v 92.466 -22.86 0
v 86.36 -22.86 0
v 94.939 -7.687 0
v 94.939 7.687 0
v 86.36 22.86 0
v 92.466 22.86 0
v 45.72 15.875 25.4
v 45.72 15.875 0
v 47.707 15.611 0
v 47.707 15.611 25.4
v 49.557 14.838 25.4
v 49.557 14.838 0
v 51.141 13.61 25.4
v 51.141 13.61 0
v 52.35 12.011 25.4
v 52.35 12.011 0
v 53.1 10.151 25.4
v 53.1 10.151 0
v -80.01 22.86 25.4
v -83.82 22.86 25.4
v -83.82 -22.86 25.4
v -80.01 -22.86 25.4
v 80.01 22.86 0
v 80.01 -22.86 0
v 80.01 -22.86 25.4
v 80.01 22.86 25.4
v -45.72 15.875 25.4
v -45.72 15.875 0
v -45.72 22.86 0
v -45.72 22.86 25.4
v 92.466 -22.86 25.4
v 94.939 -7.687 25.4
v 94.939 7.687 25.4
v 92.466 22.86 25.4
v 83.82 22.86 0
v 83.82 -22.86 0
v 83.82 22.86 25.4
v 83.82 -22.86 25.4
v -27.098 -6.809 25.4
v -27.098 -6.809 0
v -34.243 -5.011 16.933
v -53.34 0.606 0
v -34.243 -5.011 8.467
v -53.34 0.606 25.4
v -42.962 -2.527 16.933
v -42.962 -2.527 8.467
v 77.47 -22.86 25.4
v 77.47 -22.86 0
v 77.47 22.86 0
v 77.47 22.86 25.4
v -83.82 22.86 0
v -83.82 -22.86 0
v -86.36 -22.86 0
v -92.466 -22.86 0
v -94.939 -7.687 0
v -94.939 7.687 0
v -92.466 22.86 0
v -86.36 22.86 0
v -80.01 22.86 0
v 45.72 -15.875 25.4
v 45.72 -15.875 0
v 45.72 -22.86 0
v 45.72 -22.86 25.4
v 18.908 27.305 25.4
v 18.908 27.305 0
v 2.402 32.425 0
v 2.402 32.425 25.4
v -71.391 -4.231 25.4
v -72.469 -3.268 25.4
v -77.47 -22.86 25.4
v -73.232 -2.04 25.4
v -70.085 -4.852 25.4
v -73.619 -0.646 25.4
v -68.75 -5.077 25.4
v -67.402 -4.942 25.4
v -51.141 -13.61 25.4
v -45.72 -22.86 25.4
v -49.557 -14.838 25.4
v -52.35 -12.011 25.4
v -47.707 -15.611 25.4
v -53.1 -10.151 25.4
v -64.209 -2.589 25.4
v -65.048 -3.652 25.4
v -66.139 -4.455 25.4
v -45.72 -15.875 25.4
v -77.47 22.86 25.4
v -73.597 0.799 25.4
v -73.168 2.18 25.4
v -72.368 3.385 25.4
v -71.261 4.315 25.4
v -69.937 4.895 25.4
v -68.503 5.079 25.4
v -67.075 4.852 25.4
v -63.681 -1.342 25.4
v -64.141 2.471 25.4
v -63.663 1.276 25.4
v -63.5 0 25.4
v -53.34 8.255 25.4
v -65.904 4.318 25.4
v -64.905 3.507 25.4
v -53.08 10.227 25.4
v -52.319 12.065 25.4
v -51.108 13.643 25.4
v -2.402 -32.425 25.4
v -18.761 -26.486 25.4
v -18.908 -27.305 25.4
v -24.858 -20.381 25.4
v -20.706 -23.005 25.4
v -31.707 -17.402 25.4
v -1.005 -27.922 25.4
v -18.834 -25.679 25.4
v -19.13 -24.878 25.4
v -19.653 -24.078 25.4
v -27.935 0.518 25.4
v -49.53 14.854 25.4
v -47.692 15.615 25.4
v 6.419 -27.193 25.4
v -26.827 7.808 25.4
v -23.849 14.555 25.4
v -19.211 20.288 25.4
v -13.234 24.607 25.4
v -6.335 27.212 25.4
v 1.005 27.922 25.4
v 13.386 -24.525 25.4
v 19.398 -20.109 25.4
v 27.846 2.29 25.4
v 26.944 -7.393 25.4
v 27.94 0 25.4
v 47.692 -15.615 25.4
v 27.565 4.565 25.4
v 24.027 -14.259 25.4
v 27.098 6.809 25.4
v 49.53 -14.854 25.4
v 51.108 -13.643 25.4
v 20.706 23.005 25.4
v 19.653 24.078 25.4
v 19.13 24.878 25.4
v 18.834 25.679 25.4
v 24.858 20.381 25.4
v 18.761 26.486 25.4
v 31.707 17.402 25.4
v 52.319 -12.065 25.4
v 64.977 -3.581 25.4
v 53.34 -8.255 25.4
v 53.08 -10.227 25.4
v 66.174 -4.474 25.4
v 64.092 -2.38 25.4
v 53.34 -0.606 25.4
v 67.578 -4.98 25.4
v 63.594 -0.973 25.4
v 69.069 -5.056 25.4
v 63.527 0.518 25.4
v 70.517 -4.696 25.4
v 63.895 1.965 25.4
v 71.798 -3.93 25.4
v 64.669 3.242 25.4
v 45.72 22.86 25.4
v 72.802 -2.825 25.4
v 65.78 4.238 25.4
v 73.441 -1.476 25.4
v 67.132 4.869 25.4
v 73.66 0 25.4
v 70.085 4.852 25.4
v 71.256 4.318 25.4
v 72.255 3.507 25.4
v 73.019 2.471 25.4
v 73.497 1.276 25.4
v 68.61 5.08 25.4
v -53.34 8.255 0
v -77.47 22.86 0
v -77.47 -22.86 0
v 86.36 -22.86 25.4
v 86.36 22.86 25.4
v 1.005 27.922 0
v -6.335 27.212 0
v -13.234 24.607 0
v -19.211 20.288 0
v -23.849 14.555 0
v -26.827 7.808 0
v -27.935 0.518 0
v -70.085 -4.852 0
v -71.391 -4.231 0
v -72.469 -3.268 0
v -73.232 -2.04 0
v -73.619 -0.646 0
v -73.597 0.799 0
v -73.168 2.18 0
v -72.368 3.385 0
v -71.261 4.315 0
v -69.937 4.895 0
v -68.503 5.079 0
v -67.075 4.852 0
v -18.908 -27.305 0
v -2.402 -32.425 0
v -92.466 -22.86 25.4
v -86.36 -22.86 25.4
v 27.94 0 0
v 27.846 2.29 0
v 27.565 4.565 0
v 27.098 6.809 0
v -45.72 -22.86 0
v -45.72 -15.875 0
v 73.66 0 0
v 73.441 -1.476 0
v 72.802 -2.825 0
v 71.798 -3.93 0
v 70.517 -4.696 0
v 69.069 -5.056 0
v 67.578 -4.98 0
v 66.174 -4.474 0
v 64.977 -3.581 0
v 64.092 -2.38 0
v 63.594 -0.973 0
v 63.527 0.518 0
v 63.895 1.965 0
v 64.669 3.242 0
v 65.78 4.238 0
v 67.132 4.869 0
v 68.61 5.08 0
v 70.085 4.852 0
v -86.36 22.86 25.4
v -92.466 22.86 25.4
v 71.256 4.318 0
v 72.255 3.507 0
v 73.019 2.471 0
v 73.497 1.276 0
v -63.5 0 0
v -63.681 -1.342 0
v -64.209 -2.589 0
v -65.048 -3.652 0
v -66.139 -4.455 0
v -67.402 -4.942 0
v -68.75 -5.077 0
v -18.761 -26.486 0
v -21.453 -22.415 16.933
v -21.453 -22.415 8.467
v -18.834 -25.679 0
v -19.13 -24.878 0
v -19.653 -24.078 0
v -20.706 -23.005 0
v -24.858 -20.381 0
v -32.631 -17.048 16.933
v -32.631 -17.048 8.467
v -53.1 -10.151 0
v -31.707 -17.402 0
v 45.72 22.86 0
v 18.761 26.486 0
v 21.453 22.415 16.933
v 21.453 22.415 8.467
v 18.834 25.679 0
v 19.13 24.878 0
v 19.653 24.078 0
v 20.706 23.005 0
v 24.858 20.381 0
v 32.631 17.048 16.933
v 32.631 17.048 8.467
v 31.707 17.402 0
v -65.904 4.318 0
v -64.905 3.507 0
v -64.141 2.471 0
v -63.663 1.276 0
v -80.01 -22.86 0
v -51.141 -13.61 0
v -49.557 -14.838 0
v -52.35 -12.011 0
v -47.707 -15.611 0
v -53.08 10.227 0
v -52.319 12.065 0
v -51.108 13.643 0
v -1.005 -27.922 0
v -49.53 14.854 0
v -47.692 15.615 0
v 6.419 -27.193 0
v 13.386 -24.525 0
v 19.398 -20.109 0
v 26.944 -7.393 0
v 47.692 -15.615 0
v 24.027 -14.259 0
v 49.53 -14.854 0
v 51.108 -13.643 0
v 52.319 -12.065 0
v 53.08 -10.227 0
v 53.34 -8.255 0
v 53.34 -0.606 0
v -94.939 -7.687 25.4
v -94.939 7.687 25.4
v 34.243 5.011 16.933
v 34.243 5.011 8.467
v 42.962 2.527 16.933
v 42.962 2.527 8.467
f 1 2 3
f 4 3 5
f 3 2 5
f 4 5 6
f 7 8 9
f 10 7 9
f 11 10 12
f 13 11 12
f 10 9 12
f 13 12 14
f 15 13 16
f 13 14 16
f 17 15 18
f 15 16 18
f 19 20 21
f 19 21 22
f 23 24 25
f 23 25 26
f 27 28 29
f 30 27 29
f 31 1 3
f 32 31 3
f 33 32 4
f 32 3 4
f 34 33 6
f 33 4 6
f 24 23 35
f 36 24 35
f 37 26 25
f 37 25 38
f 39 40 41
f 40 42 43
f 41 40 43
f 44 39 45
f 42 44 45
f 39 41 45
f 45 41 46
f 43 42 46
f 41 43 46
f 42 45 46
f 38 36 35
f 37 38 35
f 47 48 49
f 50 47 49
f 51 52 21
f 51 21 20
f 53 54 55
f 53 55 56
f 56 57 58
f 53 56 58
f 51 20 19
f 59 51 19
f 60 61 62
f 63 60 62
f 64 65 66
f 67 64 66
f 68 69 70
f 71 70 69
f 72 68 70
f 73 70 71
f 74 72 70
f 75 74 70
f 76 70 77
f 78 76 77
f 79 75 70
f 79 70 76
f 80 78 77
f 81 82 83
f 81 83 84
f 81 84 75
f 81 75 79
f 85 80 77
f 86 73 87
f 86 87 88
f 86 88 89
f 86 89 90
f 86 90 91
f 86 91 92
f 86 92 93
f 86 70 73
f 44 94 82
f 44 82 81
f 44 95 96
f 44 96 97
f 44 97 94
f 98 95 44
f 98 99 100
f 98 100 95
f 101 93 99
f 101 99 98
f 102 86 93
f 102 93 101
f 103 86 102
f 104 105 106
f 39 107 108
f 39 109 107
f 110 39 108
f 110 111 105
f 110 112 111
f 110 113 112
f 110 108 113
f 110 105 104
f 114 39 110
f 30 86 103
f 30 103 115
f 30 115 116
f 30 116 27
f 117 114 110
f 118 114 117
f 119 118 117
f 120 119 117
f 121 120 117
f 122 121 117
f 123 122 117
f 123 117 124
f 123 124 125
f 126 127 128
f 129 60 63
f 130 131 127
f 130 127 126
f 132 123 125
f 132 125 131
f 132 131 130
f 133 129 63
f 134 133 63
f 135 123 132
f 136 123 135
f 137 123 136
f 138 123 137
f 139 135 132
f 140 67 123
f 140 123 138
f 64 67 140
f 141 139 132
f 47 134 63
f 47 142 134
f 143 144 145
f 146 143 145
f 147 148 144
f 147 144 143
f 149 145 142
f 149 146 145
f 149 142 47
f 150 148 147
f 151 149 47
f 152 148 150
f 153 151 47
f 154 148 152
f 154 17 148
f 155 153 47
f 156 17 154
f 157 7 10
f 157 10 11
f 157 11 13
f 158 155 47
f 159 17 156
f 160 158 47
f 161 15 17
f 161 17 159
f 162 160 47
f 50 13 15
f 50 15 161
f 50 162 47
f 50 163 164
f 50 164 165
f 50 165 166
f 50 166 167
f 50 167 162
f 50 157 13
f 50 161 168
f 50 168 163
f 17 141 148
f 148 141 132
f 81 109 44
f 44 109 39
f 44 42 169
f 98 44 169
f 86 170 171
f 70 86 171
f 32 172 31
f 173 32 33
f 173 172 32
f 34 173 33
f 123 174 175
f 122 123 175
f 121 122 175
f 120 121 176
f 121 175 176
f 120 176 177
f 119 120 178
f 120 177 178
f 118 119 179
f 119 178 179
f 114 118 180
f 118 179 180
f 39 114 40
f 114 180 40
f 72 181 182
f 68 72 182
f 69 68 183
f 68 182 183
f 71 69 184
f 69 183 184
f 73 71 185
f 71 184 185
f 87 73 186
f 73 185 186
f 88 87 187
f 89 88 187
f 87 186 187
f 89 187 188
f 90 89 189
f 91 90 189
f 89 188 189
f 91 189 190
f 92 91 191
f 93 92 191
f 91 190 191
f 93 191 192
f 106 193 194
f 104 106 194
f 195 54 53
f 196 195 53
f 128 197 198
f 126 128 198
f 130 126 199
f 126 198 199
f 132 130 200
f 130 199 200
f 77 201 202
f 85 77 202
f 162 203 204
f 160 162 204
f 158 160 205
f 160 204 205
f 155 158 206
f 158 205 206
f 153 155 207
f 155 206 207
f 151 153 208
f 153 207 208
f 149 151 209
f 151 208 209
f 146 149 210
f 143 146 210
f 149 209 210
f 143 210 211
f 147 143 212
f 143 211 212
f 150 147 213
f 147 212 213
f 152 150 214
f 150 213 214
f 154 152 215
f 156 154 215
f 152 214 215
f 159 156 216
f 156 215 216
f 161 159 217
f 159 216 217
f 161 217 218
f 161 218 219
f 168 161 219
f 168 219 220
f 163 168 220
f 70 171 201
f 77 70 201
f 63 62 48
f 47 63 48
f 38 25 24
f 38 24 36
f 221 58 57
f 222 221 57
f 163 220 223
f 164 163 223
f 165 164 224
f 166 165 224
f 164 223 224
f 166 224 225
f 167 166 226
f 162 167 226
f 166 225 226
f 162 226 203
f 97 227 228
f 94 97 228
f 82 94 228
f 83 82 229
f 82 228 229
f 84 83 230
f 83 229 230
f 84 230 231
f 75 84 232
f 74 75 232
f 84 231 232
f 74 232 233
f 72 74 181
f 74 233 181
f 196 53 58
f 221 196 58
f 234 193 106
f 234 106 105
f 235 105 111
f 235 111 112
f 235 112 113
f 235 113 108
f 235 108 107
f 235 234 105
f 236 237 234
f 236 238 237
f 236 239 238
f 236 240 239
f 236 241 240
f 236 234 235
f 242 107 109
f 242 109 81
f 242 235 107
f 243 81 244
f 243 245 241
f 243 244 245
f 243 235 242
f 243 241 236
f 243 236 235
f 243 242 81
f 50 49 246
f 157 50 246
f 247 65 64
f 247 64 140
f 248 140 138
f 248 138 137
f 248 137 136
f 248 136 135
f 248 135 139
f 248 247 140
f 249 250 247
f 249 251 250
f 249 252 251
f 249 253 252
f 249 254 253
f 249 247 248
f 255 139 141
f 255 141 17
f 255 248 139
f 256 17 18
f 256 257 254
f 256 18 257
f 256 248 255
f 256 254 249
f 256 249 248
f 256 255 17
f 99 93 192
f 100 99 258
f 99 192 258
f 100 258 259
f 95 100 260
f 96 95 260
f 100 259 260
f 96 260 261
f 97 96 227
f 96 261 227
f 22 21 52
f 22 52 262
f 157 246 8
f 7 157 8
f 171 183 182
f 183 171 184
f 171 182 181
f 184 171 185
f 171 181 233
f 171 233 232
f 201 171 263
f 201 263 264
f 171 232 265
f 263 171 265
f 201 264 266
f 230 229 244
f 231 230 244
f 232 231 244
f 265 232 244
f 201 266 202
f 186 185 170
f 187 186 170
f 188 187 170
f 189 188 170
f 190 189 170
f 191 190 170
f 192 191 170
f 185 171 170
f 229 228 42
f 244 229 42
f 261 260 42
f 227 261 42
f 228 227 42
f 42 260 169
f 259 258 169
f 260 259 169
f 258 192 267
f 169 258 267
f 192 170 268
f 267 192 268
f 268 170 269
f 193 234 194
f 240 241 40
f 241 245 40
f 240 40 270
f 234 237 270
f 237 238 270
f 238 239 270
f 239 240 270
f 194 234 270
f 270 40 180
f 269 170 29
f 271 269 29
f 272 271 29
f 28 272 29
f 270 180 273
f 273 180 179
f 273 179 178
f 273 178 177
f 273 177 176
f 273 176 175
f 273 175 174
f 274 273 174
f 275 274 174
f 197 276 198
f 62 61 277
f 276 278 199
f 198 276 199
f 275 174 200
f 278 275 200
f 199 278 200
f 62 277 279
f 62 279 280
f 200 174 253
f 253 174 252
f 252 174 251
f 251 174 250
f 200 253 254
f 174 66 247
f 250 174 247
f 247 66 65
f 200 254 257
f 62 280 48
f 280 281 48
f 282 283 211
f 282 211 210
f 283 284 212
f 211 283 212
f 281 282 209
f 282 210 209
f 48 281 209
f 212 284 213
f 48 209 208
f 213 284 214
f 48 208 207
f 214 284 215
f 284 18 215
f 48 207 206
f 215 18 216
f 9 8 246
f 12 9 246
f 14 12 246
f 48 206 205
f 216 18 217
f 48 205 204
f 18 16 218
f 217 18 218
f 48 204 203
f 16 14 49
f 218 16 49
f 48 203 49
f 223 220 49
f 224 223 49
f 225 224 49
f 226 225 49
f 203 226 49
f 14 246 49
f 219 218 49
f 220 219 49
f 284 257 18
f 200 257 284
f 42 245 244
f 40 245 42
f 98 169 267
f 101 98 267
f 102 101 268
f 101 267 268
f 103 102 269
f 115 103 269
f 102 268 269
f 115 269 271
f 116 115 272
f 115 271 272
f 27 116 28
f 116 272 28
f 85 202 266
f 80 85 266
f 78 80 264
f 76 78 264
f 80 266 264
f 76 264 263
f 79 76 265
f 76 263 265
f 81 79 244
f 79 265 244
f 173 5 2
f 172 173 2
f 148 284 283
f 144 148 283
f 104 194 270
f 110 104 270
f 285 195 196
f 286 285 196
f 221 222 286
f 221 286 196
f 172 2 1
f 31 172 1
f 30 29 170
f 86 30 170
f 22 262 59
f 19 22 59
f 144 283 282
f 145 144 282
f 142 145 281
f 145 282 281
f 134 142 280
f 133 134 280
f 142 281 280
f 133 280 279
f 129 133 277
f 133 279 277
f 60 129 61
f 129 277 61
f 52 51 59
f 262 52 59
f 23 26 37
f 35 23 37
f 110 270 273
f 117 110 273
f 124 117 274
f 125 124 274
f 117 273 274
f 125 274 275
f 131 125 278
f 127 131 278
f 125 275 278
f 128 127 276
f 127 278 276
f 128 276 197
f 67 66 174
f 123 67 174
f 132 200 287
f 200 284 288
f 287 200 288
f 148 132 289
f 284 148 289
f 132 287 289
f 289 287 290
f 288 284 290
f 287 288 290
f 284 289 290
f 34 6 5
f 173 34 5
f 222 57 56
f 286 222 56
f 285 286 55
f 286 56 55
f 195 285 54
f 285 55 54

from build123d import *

# Parameters (mm, degrees)
F0_DEPTH = 25.4
F1_W     = 3.81
F1_H     = 45.72


with BuildPart() as f0:
    # F1 (on Top) → F0 (new body)
    with BuildSketch(Plane.XY):
        with BuildLine():
            Line((77.47, 22.86), (45.72, 22.86))
            Line((45.72, 22.86), (45.72, 15.875))
            ThreePointArc((45.72, 15.875), (50.3897919484, 14.2764153784), (53.1002511947, 10.1513892806))
            add(Edge.make_bspline(
                [(53.1002511947, 10.1513892806), (58.1589510072, 8.551724236), (63.812727866, 6.7977717351), (70.0851851843, 4.8518880408)],
                knots=[46.5844881463, 46.5844881463, 46.5844881463, 46.5844881463, 55.8862582945, 55.8862582945, 55.8862582945, 55.8862582945], degree=3))
            ThreePointArc((70.0851851843, 4.8518880408), (72.6697885481, 3.0133087515), (73.66, 0))
            ThreePointArc((73.66, 0), (71.5933087511, -4.0897885484), (67.0748148148, -4.8518880406))
            add(Edge.make_bspline(
                [(53.34, -0.6059576), (57.5451254916, -1.8955240295), (62.1166858374, -3.3137440808), (67.0748148148, -4.8518880406)],
                knots=[48.5335775556, 48.5335775556, 48.5335775556, 48.5335775556, 55.8862582953, 55.8862582953, 55.8862582953, 55.8862582953], degree=3))
            Line((53.34, -0.6059576), (53.34, -8.255))
            ThreePointArc((53.34, -8.255), (51.1081536726, -13.6431536726), (45.72, -15.875))
            Line((45.72, -15.875), (45.72, -22.86))
            Line((45.72, -22.86), (77.47, -22.86))
            Line((77.47, -22.86), (77.47, 22.86))
        make_face()
        with BuildLine():
            add(Edge.make_bspline(
                [(53.1002511947, 10.1513892806), (58.1589510072, 8.551724236), (63.812727866, 6.7977717351), (70.0851851843, 4.8518880408)],
                knots=[46.5844881463, 46.5844881463, 46.5844881463, 46.5844881463, 55.8862582945, 55.8862582945, 55.8862582945, 55.8862582945], degree=3))
            ThreePointArc((53.1002511947, 10.1513892806), (53.2798251998, 9.210742093), (53.34, 8.255))
            Line((53.34, 8.255), (53.34, -0.6059576))
            add(Edge.make_bspline(
                [(53.34, -0.6059576), (57.5451254916, -1.8955240295), (62.1166858374, -3.3137440808), (67.0748148148, -4.8518880406)],
                knots=[48.5335775556, 48.5335775556, 48.5335775556, 48.5335775556, 55.8862582953, 55.8862582953, 55.8862582953, 55.8862582953], degree=3))
            ThreePointArc((67.0748148148, -4.8518880406), (63.7281119593, 1.5051851848), (70.0851851843, 4.8518880408))
        make_face()
        with BuildLine():
            ThreePointArc((53.34, 8.255), (53.2798251998, 9.210742093), (53.1002511947, 10.1513892806))
            add(Edge.make_bspline(
                [(18.9075672089, 27.3046224959), (17.3563376005, 22.3043125946), (27.7656172811, 18.1627221903), (53.1002511947, 10.1513892806)],
                knots=[0, 0, 0, 0, 46.5844881463, 46.5844881463, 46.5844881463, 46.5844881463], degree=3))
            Line((18.9075672089, 27.3046224959), (2.4020174164, 32.4250846362))
            Line((2.4020174164, 32.4250846362), (1.0050151405, 27.9219187121))
            ThreePointArc((1.0050151405, 27.9219187121), (17.5750428532, 21.7200706423), (27.0976887869, 6.8087342735))
            add(Edge.make_bspline(
                [(27.0976887869, 6.8087342735), (33.4853412167, 5.3665593675), (42.104777648, 2.8394961928), (53.34, -0.6059576)],
                knots=[28.888740996, 28.888740996, 28.888740996, 28.888740996, 48.5335775556, 48.5335775556, 48.5335775556, 48.5335775556], degree=3))
            Line((53.34, -0.6059576), (53.34, 8.255))
        make_face()
        with BuildLine():
            ThreePointArc((27.94, 0), (27.7286226191, 3.4303188841), (27.0976887869, 6.8087342735))
            ThreePointArc((27.0976887869, 6.8087342735), (17.5750428532, 21.7200706423), (1.0050151405, 27.9219187121))
            ThreePointArc((1.0050151405, 27.9219187121), (-21.7200706423, 17.5750428532), (-27.0976887869, -6.8087342735))
            ThreePointArc((-27.0976887869, -6.8087342735), (-17.5750428532, -21.7200706423), (-1.0050151405, -27.9219187121))
            ThreePointArc((-1.0050151405, -27.9219187121), (19.3979828458, -20.108750869), (27.94, 0))
        make_face()
        with BuildLine():
            ThreePointArc((-1.0050151405, -27.9219187121), (-17.5750428532, -21.7200706423), (-27.0976887869, -6.8087342735))
            add(Edge.make_bspline(
                [(-27.0976887869, -6.8087342735), (-33.4853412167, -5.3665593675), (-42.104777648, -2.8394961928), (-53.34, 0.6059576)],
                knots=[28.888740996, 28.888740996, 28.888740996, 28.888740996, 48.5335775556, 48.5335775556, 48.5335775556, 48.5335775556], degree=3))
            Line((-53.34, 0.6059576), (-53.34, -8.255))
            ThreePointArc((-53.34, -8.255), (-53.2798251998, -9.210742093), (-53.1002511947, -10.1513892806))
            add(Edge.make_bspline(
                [(-18.9075672089, -27.3046224959), (-17.3563376005, -22.3043125946), (-27.7656172811, -18.1627221903), (-53.1002511947, -10.1513892806)],
                knots=[0, 0, 0, 0, 46.5844881463, 46.5844881463, 46.5844881463, 46.5844881463], degree=3))
            Line((-18.9075672089, -27.3046224959), (-2.4020174164, -32.4250846362))
            Line((-2.4020174164, -32.4250846362), (-1.0050151405, -27.9219187121))
        make_face()
        with BuildLine():
            add(Edge.make_bspline(
                [(-53.34, 0.6059576), (-57.5451254916, 1.8955240295), (-62.1166858374, 3.3137440808), (-67.0748148148, 4.8518880406)],
                knots=[48.5335775556, 48.5335775556, 48.5335775556, 48.5335775556, 55.8862582953, 55.8862582953, 55.8862582953, 55.8862582953], degree=3))
            Line((-53.34, 0.6059576), (-53.34, 8.255))
            ThreePointArc((-53.34, 8.255), (-51.1081536726, 13.6431536726), (-45.72, 15.875))
            Line((-45.72, 15.875), (-45.72, 22.86))
            Line((-45.72, 22.86), (-77.47, 22.86))
            Line((-77.47, 22.86), (-77.47, -22.86))
            Line((-77.47, -22.86), (-45.72, -22.86))
            Line((-45.72, -22.86), (-45.72, -15.875))
            ThreePointArc((-45.72, -15.875), (-50.3897919484, -14.2764153784), (-53.1002511947, -10.1513892806))
            add(Edge.make_bspline(
                [(-53.1002511947, -10.1513892806), (-58.1589510072, -8.551724236), (-63.812727866, -6.7977717351), (-70.0851851843, -4.8518880408)],
                knots=[46.5844881463, 46.5844881463, 46.5844881463, 46.5844881463, 55.8862582945, 55.8862582945, 55.8862582945, 55.8862582945], degree=3))
            ThreePointArc((-70.0851851843, -4.8518880408), (-73.4318880407, 1.5051851848), (-67.0748148148, 4.8518880406))
        make_face()
        with BuildLine():
            Line((-53.34, -8.255), (-53.34, 0.6059576))
            add(Edge.make_bspline(
                [(-53.34, 0.6059576), (-57.5451254916, 1.8955240295), (-62.1166858374, 3.3137440808), (-67.0748148148, 4.8518880406)],
                knots=[48.5335775556, 48.5335775556, 48.5335775556, 48.5335775556, 55.8862582953, 55.8862582953, 55.8862582953, 55.8862582953], degree=3))
            ThreePointArc((-67.0748148148, 4.8518880406), (-64.4902114516, 3.0133087511), (-63.5, 0))
            ThreePointArc((-63.5, 0), (-65.5666912485, -4.0897885481), (-70.0851851843, -4.8518880408))
            add(Edge.make_bspline(
                [(-53.1002511947, -10.1513892806), (-58.1589510072, -8.551724236), (-63.812727866, -6.7977717351), (-70.0851851843, -4.8518880408)],
                knots=[46.5844881463, 46.5844881463, 46.5844881463, 46.5844881463, 55.8862582945, 55.8862582945, 55.8862582945, 55.8862582945], degree=3))
            ThreePointArc((-53.1002511947, -10.1513892806), (-53.2798251998, -9.210742093), (-53.34, -8.255))
        make_face()
    extrude(amount=F0_DEPTH)


with BuildPart() as f0b:
    # F1 (on Top) → F0, piece 2 (new body)
    with BuildSketch(Plane.XY):
        with BuildLine():
            Line((92.4661175783, 22.86), (86.36, 22.86))
            Line((86.36, 22.86), (86.36, -22.86))
            Line((86.36, -22.86), (92.4661175783, -22.86))
            ThreePointArc((92.4661175783, -22.86), (95.25, 0), (92.4661175783, 22.86))
        make_face()
    extrude(amount=F0_DEPTH)


with BuildPart() as f0c:
    # F1 (on Top) → F0, piece 3 (new body)
    with BuildSketch(Plane.XY):
        with Locations((81.915, 0)):
            Rectangle(F1_W, F1_H)
    extrude(amount=F0_DEPTH)


with BuildPart() as f0d:
    # F1 (on Top) → F0, piece 4 (new body)
    with BuildSketch(Plane.XY):
        with Locations((-81.915, 0)):
            Rectangle(F1_W, F1_H)
    extrude(amount=F0_DEPTH)


with BuildPart() as f0e:
    # F1 (on Top) → F0, piece 5 (new body)
    with BuildSketch(Plane.XY):
        with BuildLine():
            Line((-92.4661175783, -22.86), (-86.36, -22.86))
            Line((-86.36, -22.86), (-86.36, 22.86))
            Line((-86.36, 22.86), (-92.4661175783, 22.86))
            ThreePointArc((-92.4661175783, 22.86), (-95.25, 0), (-92.4661175783, -22.86))
        make_face()
    extrude(amount=F0_DEPTH)


solid = Compound([f0.part, f0b.part, f0c.part, f0d.part, f0e.part])
